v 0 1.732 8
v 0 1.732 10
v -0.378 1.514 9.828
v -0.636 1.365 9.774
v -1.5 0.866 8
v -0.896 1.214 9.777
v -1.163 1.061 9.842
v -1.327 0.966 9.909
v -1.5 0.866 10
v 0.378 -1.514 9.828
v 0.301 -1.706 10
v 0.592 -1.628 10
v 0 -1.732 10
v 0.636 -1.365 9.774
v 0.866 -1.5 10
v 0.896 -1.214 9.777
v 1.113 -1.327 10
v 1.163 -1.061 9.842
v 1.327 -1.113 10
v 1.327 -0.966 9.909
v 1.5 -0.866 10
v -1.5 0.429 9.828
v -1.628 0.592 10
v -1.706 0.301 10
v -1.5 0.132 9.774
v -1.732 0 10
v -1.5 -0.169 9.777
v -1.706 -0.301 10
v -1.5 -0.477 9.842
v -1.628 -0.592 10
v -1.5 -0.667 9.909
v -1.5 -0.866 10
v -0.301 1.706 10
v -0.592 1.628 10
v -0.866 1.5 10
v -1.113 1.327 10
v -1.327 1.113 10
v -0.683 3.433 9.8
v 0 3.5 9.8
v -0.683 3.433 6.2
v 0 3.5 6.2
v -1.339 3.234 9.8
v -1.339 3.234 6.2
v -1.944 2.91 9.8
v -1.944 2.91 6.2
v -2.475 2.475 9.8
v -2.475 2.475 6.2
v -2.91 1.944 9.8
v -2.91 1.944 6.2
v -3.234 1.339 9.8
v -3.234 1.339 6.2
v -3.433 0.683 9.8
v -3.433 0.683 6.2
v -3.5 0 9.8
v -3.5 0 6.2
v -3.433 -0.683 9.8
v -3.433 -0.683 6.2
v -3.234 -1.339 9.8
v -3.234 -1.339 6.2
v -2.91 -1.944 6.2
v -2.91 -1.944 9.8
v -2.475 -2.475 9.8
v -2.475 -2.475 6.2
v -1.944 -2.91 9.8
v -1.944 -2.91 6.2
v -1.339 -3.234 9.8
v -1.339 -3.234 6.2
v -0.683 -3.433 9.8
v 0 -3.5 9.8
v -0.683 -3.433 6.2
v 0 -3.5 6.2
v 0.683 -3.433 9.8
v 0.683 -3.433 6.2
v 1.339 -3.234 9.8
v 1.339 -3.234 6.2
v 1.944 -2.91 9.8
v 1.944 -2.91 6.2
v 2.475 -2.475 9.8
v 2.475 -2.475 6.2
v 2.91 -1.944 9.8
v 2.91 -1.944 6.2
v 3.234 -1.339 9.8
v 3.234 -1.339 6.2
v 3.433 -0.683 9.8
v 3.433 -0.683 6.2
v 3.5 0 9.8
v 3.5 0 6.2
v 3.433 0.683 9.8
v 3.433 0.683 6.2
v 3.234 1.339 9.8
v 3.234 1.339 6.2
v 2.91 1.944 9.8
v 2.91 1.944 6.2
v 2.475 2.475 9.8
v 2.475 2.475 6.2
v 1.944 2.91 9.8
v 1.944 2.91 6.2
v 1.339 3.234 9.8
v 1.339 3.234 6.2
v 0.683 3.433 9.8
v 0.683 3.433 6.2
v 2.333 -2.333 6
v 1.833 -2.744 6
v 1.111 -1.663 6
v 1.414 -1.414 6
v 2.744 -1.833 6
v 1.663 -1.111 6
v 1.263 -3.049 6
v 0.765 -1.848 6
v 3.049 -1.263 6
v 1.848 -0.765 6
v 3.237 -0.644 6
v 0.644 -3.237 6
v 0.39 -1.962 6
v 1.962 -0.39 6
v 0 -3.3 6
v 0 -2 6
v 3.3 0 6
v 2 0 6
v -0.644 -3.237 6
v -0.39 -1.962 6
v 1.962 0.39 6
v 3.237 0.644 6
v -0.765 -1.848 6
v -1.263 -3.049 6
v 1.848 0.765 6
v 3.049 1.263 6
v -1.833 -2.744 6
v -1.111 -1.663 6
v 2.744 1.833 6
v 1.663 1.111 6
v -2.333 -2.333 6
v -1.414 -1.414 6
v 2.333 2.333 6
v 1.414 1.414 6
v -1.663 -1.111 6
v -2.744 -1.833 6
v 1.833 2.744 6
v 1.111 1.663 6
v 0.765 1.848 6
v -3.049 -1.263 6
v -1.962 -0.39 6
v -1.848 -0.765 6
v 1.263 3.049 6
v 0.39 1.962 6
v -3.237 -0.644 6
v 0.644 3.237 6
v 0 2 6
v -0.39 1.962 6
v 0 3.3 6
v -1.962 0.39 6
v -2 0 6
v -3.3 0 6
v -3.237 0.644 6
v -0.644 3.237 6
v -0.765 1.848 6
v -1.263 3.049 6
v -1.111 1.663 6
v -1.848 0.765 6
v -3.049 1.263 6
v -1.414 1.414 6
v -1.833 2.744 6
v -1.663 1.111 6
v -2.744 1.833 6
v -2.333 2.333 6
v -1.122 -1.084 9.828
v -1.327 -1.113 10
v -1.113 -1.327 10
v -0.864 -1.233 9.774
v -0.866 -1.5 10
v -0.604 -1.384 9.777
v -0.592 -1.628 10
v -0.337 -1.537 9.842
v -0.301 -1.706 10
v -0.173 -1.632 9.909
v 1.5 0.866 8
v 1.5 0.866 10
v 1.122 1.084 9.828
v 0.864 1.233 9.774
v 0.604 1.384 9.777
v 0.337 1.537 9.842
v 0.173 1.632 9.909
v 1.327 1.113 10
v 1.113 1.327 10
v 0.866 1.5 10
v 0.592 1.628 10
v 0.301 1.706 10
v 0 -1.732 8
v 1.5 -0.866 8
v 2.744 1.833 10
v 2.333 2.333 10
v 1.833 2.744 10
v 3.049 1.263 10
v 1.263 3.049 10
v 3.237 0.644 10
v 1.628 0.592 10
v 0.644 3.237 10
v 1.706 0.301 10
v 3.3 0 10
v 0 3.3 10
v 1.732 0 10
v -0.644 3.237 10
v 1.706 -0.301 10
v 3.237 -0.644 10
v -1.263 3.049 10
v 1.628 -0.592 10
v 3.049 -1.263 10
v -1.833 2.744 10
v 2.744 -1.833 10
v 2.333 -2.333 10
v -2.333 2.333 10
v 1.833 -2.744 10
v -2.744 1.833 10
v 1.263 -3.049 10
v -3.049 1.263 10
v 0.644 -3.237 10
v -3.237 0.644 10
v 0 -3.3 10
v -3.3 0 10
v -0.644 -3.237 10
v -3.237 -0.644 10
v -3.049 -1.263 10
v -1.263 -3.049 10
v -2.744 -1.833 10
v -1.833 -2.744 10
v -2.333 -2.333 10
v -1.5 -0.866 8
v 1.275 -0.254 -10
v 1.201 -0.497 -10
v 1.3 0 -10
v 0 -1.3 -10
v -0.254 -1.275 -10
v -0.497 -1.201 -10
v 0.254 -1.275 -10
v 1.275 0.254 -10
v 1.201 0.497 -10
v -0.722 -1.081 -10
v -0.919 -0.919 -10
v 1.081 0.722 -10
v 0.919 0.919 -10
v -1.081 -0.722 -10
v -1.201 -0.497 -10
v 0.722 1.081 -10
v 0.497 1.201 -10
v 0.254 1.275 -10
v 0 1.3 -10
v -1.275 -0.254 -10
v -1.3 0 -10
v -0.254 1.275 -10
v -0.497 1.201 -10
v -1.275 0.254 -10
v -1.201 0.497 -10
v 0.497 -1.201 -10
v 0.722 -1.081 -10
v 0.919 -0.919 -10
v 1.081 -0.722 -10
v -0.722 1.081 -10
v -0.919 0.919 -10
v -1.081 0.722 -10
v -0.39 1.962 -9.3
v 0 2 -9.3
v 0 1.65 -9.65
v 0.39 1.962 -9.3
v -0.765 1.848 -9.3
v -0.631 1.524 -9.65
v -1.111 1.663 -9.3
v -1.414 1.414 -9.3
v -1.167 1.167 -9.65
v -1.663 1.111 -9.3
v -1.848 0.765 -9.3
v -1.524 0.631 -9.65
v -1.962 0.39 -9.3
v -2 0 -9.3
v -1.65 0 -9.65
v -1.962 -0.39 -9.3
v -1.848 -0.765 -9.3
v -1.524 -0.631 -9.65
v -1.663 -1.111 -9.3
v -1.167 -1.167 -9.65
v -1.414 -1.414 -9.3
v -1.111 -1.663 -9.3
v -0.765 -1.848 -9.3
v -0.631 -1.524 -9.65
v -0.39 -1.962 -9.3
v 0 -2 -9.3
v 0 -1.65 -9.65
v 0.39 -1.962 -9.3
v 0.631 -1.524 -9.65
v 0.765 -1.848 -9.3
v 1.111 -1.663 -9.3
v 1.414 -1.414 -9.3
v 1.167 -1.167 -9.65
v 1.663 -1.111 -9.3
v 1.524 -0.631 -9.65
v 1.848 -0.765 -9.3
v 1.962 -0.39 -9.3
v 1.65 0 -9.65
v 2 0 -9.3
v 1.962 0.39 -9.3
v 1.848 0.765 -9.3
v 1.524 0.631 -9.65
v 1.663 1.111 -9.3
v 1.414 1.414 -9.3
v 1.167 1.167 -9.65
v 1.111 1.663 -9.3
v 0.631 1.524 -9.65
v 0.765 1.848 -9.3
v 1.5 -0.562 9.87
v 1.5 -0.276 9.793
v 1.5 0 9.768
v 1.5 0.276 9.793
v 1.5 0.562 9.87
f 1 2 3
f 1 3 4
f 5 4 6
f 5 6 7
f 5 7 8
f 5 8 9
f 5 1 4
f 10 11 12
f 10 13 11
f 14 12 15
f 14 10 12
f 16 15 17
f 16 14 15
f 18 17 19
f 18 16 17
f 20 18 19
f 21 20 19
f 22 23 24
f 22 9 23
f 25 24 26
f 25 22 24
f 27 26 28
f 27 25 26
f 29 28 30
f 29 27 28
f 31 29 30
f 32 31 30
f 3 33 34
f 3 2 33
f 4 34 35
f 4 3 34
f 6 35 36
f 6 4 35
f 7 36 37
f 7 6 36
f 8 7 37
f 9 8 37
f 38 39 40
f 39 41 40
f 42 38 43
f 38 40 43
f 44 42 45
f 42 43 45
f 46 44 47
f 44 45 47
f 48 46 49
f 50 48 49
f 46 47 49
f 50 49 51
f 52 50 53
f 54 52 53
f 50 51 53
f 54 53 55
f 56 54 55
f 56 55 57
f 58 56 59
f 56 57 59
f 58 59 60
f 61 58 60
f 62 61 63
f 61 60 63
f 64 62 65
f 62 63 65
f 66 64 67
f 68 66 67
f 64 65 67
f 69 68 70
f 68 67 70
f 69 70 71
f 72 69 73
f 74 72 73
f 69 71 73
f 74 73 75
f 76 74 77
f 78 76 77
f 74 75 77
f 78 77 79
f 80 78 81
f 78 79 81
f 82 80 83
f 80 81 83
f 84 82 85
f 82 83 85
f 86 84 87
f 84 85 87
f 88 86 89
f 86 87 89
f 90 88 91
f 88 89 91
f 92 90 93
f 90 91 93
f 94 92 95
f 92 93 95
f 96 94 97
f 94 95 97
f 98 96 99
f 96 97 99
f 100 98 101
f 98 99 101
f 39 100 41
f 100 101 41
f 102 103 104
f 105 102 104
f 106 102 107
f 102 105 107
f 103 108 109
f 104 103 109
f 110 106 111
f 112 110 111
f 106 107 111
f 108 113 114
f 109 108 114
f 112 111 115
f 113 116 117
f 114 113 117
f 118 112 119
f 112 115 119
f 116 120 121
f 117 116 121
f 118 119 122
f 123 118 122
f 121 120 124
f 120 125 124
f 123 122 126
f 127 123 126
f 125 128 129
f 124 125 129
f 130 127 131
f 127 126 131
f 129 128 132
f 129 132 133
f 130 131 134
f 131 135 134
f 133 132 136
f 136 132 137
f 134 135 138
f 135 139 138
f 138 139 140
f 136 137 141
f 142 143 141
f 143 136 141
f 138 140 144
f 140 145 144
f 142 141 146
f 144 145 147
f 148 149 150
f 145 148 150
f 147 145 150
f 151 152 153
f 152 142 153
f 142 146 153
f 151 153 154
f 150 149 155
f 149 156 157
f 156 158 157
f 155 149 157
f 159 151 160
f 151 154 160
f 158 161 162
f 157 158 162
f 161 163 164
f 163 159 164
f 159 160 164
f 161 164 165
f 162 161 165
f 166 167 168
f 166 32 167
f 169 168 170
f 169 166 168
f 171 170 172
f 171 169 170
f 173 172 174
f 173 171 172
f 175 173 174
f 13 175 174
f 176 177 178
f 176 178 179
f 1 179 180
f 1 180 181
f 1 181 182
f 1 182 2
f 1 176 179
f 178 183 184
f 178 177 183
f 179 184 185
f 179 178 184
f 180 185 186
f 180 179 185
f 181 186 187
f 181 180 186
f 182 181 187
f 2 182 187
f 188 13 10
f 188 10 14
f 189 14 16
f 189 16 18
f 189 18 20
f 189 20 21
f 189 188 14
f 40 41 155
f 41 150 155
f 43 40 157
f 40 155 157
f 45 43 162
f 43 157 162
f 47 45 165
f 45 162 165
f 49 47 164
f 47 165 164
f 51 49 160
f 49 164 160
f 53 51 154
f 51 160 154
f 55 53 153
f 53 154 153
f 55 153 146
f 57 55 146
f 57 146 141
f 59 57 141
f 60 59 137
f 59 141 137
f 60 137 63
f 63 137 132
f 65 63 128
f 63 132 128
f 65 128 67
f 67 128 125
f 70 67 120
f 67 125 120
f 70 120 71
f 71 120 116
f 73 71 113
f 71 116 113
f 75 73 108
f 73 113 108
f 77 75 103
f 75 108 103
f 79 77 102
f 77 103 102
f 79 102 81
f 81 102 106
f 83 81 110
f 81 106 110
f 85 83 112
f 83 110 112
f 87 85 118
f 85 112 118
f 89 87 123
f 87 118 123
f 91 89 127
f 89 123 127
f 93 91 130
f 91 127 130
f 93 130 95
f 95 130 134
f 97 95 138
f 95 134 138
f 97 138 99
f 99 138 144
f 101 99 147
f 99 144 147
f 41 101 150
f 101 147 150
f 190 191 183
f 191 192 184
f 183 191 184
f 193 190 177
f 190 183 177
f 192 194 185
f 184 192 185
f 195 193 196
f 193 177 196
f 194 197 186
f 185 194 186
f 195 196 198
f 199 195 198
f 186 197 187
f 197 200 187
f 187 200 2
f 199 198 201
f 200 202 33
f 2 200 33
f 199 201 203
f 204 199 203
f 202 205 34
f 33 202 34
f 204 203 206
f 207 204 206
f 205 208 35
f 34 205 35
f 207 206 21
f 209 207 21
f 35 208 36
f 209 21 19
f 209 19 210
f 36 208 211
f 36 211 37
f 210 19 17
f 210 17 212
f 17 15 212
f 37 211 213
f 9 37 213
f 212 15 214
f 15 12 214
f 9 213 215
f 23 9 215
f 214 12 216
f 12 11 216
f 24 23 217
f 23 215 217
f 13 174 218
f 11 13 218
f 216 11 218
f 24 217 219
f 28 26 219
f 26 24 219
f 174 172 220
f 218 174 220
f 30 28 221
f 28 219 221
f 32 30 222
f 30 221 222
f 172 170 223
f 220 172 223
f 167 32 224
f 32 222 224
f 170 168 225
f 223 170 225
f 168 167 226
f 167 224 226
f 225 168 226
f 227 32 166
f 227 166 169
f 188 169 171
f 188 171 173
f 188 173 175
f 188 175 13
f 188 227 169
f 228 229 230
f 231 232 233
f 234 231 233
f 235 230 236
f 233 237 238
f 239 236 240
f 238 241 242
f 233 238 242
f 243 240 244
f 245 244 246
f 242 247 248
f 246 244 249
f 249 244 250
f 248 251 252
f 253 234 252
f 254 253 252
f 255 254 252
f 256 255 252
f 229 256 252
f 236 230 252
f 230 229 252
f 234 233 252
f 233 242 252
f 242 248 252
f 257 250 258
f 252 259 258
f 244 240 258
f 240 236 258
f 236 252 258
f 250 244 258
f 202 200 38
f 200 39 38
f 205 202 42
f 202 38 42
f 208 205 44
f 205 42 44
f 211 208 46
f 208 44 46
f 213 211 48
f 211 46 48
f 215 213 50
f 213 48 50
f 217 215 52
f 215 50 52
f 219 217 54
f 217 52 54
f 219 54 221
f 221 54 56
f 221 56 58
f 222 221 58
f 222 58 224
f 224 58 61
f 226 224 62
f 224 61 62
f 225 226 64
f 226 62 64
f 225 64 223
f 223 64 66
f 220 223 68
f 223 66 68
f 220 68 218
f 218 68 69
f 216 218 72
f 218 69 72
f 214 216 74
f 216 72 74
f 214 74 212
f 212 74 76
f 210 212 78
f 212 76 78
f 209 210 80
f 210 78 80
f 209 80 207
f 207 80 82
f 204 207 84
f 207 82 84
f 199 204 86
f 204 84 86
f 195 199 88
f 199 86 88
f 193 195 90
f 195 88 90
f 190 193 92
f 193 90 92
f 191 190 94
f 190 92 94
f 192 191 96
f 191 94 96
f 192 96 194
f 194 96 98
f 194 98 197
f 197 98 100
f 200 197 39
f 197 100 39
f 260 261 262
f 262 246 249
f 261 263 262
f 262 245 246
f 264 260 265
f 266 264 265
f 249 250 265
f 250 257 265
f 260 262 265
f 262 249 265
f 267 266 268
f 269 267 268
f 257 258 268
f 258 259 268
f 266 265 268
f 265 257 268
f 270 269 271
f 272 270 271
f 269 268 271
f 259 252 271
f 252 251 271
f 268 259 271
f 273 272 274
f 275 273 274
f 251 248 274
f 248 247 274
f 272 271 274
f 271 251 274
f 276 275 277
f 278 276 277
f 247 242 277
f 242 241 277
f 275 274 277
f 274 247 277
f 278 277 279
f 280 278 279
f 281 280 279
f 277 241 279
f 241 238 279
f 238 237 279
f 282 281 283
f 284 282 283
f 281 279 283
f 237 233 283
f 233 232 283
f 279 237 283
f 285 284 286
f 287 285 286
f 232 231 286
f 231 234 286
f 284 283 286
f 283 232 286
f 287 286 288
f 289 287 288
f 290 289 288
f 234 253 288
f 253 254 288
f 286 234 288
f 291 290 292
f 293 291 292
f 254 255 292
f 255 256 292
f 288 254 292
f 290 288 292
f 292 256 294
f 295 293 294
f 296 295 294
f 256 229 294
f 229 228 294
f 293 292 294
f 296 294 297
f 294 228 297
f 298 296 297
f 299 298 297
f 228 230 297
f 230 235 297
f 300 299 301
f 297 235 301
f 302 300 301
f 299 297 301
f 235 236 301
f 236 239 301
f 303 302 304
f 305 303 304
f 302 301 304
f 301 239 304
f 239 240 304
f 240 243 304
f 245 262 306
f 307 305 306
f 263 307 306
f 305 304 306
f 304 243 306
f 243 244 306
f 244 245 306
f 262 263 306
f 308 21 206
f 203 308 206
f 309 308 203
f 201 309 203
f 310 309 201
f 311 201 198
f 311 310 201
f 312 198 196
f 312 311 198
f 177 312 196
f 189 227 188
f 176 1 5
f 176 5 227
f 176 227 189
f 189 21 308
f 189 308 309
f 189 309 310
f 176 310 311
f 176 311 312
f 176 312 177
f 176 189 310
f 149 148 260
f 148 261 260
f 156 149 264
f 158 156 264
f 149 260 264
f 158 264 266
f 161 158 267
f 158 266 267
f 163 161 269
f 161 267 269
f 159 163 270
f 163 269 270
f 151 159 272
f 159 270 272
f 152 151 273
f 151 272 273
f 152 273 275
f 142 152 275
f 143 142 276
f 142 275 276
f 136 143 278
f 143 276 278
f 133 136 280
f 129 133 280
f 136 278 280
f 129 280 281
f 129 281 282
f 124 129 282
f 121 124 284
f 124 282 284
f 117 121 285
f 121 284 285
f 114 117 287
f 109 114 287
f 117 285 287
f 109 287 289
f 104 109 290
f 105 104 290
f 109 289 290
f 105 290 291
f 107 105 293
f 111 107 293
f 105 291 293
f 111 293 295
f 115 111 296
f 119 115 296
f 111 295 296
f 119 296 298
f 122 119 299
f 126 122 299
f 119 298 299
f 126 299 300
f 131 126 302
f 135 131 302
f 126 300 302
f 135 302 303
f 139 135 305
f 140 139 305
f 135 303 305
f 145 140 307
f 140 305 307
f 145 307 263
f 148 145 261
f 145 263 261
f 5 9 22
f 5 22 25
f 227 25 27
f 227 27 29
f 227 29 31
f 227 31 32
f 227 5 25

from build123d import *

# Parameters (mm, degrees)
CUT_EXTRUDE1_START = -2
CUT_EXTRUDE1_DEPTH = 2
SKETCH4_R          = 1.732050808
CUT_EXTRUDE2_DEPTH = 0.5
CUT_EXTRUDE2_TAPER = 45


with BuildPart() as part:
    # Sketch2 → Revolve1 (revolve)
    with BuildSketch(Plane(origin=(0, 0, 0), x_dir=(0, 0, -1), z_dir=(1, 0, 0))):
        Polygon((-9.8, 3.5), (-6.2, 3.5), (-6, 3.3), (-6, 2), (9.3, 2), (10, 1.3), (10, 0), (-10, 0), (-10, 3.3), align=None)
    revolve(axis=Axis((0, 0, -10), (0, 0, 1)))

    # Sketch3 → Cut-Extrude1 (cut)
    with BuildSketch(Plane.XY.offset(10).offset(CUT_EXTRUDE1_START)):
        Polygon((0, 1.732050808), (-1.5, 0.866025404), (-1.5, -0.866025404), (0, -1.732050808), (1.5, -0.866025404), (1.5, 0.866025404), align=None)
    extrude(amount=CUT_EXTRUDE1_DEPTH, mode=Mode.SUBTRACT)

    # Sketch4 → Cut-Extrude2 (cut)
    with BuildSketch(Plane.XY.offset(10)):
        Circle(SKETCH4_R)
    extrude(amount=-CUT_EXTRUDE2_DEPTH, taper=CUT_EXTRUDE2_TAPER, mode=Mode.SUBTRACT)


solid = part.part
